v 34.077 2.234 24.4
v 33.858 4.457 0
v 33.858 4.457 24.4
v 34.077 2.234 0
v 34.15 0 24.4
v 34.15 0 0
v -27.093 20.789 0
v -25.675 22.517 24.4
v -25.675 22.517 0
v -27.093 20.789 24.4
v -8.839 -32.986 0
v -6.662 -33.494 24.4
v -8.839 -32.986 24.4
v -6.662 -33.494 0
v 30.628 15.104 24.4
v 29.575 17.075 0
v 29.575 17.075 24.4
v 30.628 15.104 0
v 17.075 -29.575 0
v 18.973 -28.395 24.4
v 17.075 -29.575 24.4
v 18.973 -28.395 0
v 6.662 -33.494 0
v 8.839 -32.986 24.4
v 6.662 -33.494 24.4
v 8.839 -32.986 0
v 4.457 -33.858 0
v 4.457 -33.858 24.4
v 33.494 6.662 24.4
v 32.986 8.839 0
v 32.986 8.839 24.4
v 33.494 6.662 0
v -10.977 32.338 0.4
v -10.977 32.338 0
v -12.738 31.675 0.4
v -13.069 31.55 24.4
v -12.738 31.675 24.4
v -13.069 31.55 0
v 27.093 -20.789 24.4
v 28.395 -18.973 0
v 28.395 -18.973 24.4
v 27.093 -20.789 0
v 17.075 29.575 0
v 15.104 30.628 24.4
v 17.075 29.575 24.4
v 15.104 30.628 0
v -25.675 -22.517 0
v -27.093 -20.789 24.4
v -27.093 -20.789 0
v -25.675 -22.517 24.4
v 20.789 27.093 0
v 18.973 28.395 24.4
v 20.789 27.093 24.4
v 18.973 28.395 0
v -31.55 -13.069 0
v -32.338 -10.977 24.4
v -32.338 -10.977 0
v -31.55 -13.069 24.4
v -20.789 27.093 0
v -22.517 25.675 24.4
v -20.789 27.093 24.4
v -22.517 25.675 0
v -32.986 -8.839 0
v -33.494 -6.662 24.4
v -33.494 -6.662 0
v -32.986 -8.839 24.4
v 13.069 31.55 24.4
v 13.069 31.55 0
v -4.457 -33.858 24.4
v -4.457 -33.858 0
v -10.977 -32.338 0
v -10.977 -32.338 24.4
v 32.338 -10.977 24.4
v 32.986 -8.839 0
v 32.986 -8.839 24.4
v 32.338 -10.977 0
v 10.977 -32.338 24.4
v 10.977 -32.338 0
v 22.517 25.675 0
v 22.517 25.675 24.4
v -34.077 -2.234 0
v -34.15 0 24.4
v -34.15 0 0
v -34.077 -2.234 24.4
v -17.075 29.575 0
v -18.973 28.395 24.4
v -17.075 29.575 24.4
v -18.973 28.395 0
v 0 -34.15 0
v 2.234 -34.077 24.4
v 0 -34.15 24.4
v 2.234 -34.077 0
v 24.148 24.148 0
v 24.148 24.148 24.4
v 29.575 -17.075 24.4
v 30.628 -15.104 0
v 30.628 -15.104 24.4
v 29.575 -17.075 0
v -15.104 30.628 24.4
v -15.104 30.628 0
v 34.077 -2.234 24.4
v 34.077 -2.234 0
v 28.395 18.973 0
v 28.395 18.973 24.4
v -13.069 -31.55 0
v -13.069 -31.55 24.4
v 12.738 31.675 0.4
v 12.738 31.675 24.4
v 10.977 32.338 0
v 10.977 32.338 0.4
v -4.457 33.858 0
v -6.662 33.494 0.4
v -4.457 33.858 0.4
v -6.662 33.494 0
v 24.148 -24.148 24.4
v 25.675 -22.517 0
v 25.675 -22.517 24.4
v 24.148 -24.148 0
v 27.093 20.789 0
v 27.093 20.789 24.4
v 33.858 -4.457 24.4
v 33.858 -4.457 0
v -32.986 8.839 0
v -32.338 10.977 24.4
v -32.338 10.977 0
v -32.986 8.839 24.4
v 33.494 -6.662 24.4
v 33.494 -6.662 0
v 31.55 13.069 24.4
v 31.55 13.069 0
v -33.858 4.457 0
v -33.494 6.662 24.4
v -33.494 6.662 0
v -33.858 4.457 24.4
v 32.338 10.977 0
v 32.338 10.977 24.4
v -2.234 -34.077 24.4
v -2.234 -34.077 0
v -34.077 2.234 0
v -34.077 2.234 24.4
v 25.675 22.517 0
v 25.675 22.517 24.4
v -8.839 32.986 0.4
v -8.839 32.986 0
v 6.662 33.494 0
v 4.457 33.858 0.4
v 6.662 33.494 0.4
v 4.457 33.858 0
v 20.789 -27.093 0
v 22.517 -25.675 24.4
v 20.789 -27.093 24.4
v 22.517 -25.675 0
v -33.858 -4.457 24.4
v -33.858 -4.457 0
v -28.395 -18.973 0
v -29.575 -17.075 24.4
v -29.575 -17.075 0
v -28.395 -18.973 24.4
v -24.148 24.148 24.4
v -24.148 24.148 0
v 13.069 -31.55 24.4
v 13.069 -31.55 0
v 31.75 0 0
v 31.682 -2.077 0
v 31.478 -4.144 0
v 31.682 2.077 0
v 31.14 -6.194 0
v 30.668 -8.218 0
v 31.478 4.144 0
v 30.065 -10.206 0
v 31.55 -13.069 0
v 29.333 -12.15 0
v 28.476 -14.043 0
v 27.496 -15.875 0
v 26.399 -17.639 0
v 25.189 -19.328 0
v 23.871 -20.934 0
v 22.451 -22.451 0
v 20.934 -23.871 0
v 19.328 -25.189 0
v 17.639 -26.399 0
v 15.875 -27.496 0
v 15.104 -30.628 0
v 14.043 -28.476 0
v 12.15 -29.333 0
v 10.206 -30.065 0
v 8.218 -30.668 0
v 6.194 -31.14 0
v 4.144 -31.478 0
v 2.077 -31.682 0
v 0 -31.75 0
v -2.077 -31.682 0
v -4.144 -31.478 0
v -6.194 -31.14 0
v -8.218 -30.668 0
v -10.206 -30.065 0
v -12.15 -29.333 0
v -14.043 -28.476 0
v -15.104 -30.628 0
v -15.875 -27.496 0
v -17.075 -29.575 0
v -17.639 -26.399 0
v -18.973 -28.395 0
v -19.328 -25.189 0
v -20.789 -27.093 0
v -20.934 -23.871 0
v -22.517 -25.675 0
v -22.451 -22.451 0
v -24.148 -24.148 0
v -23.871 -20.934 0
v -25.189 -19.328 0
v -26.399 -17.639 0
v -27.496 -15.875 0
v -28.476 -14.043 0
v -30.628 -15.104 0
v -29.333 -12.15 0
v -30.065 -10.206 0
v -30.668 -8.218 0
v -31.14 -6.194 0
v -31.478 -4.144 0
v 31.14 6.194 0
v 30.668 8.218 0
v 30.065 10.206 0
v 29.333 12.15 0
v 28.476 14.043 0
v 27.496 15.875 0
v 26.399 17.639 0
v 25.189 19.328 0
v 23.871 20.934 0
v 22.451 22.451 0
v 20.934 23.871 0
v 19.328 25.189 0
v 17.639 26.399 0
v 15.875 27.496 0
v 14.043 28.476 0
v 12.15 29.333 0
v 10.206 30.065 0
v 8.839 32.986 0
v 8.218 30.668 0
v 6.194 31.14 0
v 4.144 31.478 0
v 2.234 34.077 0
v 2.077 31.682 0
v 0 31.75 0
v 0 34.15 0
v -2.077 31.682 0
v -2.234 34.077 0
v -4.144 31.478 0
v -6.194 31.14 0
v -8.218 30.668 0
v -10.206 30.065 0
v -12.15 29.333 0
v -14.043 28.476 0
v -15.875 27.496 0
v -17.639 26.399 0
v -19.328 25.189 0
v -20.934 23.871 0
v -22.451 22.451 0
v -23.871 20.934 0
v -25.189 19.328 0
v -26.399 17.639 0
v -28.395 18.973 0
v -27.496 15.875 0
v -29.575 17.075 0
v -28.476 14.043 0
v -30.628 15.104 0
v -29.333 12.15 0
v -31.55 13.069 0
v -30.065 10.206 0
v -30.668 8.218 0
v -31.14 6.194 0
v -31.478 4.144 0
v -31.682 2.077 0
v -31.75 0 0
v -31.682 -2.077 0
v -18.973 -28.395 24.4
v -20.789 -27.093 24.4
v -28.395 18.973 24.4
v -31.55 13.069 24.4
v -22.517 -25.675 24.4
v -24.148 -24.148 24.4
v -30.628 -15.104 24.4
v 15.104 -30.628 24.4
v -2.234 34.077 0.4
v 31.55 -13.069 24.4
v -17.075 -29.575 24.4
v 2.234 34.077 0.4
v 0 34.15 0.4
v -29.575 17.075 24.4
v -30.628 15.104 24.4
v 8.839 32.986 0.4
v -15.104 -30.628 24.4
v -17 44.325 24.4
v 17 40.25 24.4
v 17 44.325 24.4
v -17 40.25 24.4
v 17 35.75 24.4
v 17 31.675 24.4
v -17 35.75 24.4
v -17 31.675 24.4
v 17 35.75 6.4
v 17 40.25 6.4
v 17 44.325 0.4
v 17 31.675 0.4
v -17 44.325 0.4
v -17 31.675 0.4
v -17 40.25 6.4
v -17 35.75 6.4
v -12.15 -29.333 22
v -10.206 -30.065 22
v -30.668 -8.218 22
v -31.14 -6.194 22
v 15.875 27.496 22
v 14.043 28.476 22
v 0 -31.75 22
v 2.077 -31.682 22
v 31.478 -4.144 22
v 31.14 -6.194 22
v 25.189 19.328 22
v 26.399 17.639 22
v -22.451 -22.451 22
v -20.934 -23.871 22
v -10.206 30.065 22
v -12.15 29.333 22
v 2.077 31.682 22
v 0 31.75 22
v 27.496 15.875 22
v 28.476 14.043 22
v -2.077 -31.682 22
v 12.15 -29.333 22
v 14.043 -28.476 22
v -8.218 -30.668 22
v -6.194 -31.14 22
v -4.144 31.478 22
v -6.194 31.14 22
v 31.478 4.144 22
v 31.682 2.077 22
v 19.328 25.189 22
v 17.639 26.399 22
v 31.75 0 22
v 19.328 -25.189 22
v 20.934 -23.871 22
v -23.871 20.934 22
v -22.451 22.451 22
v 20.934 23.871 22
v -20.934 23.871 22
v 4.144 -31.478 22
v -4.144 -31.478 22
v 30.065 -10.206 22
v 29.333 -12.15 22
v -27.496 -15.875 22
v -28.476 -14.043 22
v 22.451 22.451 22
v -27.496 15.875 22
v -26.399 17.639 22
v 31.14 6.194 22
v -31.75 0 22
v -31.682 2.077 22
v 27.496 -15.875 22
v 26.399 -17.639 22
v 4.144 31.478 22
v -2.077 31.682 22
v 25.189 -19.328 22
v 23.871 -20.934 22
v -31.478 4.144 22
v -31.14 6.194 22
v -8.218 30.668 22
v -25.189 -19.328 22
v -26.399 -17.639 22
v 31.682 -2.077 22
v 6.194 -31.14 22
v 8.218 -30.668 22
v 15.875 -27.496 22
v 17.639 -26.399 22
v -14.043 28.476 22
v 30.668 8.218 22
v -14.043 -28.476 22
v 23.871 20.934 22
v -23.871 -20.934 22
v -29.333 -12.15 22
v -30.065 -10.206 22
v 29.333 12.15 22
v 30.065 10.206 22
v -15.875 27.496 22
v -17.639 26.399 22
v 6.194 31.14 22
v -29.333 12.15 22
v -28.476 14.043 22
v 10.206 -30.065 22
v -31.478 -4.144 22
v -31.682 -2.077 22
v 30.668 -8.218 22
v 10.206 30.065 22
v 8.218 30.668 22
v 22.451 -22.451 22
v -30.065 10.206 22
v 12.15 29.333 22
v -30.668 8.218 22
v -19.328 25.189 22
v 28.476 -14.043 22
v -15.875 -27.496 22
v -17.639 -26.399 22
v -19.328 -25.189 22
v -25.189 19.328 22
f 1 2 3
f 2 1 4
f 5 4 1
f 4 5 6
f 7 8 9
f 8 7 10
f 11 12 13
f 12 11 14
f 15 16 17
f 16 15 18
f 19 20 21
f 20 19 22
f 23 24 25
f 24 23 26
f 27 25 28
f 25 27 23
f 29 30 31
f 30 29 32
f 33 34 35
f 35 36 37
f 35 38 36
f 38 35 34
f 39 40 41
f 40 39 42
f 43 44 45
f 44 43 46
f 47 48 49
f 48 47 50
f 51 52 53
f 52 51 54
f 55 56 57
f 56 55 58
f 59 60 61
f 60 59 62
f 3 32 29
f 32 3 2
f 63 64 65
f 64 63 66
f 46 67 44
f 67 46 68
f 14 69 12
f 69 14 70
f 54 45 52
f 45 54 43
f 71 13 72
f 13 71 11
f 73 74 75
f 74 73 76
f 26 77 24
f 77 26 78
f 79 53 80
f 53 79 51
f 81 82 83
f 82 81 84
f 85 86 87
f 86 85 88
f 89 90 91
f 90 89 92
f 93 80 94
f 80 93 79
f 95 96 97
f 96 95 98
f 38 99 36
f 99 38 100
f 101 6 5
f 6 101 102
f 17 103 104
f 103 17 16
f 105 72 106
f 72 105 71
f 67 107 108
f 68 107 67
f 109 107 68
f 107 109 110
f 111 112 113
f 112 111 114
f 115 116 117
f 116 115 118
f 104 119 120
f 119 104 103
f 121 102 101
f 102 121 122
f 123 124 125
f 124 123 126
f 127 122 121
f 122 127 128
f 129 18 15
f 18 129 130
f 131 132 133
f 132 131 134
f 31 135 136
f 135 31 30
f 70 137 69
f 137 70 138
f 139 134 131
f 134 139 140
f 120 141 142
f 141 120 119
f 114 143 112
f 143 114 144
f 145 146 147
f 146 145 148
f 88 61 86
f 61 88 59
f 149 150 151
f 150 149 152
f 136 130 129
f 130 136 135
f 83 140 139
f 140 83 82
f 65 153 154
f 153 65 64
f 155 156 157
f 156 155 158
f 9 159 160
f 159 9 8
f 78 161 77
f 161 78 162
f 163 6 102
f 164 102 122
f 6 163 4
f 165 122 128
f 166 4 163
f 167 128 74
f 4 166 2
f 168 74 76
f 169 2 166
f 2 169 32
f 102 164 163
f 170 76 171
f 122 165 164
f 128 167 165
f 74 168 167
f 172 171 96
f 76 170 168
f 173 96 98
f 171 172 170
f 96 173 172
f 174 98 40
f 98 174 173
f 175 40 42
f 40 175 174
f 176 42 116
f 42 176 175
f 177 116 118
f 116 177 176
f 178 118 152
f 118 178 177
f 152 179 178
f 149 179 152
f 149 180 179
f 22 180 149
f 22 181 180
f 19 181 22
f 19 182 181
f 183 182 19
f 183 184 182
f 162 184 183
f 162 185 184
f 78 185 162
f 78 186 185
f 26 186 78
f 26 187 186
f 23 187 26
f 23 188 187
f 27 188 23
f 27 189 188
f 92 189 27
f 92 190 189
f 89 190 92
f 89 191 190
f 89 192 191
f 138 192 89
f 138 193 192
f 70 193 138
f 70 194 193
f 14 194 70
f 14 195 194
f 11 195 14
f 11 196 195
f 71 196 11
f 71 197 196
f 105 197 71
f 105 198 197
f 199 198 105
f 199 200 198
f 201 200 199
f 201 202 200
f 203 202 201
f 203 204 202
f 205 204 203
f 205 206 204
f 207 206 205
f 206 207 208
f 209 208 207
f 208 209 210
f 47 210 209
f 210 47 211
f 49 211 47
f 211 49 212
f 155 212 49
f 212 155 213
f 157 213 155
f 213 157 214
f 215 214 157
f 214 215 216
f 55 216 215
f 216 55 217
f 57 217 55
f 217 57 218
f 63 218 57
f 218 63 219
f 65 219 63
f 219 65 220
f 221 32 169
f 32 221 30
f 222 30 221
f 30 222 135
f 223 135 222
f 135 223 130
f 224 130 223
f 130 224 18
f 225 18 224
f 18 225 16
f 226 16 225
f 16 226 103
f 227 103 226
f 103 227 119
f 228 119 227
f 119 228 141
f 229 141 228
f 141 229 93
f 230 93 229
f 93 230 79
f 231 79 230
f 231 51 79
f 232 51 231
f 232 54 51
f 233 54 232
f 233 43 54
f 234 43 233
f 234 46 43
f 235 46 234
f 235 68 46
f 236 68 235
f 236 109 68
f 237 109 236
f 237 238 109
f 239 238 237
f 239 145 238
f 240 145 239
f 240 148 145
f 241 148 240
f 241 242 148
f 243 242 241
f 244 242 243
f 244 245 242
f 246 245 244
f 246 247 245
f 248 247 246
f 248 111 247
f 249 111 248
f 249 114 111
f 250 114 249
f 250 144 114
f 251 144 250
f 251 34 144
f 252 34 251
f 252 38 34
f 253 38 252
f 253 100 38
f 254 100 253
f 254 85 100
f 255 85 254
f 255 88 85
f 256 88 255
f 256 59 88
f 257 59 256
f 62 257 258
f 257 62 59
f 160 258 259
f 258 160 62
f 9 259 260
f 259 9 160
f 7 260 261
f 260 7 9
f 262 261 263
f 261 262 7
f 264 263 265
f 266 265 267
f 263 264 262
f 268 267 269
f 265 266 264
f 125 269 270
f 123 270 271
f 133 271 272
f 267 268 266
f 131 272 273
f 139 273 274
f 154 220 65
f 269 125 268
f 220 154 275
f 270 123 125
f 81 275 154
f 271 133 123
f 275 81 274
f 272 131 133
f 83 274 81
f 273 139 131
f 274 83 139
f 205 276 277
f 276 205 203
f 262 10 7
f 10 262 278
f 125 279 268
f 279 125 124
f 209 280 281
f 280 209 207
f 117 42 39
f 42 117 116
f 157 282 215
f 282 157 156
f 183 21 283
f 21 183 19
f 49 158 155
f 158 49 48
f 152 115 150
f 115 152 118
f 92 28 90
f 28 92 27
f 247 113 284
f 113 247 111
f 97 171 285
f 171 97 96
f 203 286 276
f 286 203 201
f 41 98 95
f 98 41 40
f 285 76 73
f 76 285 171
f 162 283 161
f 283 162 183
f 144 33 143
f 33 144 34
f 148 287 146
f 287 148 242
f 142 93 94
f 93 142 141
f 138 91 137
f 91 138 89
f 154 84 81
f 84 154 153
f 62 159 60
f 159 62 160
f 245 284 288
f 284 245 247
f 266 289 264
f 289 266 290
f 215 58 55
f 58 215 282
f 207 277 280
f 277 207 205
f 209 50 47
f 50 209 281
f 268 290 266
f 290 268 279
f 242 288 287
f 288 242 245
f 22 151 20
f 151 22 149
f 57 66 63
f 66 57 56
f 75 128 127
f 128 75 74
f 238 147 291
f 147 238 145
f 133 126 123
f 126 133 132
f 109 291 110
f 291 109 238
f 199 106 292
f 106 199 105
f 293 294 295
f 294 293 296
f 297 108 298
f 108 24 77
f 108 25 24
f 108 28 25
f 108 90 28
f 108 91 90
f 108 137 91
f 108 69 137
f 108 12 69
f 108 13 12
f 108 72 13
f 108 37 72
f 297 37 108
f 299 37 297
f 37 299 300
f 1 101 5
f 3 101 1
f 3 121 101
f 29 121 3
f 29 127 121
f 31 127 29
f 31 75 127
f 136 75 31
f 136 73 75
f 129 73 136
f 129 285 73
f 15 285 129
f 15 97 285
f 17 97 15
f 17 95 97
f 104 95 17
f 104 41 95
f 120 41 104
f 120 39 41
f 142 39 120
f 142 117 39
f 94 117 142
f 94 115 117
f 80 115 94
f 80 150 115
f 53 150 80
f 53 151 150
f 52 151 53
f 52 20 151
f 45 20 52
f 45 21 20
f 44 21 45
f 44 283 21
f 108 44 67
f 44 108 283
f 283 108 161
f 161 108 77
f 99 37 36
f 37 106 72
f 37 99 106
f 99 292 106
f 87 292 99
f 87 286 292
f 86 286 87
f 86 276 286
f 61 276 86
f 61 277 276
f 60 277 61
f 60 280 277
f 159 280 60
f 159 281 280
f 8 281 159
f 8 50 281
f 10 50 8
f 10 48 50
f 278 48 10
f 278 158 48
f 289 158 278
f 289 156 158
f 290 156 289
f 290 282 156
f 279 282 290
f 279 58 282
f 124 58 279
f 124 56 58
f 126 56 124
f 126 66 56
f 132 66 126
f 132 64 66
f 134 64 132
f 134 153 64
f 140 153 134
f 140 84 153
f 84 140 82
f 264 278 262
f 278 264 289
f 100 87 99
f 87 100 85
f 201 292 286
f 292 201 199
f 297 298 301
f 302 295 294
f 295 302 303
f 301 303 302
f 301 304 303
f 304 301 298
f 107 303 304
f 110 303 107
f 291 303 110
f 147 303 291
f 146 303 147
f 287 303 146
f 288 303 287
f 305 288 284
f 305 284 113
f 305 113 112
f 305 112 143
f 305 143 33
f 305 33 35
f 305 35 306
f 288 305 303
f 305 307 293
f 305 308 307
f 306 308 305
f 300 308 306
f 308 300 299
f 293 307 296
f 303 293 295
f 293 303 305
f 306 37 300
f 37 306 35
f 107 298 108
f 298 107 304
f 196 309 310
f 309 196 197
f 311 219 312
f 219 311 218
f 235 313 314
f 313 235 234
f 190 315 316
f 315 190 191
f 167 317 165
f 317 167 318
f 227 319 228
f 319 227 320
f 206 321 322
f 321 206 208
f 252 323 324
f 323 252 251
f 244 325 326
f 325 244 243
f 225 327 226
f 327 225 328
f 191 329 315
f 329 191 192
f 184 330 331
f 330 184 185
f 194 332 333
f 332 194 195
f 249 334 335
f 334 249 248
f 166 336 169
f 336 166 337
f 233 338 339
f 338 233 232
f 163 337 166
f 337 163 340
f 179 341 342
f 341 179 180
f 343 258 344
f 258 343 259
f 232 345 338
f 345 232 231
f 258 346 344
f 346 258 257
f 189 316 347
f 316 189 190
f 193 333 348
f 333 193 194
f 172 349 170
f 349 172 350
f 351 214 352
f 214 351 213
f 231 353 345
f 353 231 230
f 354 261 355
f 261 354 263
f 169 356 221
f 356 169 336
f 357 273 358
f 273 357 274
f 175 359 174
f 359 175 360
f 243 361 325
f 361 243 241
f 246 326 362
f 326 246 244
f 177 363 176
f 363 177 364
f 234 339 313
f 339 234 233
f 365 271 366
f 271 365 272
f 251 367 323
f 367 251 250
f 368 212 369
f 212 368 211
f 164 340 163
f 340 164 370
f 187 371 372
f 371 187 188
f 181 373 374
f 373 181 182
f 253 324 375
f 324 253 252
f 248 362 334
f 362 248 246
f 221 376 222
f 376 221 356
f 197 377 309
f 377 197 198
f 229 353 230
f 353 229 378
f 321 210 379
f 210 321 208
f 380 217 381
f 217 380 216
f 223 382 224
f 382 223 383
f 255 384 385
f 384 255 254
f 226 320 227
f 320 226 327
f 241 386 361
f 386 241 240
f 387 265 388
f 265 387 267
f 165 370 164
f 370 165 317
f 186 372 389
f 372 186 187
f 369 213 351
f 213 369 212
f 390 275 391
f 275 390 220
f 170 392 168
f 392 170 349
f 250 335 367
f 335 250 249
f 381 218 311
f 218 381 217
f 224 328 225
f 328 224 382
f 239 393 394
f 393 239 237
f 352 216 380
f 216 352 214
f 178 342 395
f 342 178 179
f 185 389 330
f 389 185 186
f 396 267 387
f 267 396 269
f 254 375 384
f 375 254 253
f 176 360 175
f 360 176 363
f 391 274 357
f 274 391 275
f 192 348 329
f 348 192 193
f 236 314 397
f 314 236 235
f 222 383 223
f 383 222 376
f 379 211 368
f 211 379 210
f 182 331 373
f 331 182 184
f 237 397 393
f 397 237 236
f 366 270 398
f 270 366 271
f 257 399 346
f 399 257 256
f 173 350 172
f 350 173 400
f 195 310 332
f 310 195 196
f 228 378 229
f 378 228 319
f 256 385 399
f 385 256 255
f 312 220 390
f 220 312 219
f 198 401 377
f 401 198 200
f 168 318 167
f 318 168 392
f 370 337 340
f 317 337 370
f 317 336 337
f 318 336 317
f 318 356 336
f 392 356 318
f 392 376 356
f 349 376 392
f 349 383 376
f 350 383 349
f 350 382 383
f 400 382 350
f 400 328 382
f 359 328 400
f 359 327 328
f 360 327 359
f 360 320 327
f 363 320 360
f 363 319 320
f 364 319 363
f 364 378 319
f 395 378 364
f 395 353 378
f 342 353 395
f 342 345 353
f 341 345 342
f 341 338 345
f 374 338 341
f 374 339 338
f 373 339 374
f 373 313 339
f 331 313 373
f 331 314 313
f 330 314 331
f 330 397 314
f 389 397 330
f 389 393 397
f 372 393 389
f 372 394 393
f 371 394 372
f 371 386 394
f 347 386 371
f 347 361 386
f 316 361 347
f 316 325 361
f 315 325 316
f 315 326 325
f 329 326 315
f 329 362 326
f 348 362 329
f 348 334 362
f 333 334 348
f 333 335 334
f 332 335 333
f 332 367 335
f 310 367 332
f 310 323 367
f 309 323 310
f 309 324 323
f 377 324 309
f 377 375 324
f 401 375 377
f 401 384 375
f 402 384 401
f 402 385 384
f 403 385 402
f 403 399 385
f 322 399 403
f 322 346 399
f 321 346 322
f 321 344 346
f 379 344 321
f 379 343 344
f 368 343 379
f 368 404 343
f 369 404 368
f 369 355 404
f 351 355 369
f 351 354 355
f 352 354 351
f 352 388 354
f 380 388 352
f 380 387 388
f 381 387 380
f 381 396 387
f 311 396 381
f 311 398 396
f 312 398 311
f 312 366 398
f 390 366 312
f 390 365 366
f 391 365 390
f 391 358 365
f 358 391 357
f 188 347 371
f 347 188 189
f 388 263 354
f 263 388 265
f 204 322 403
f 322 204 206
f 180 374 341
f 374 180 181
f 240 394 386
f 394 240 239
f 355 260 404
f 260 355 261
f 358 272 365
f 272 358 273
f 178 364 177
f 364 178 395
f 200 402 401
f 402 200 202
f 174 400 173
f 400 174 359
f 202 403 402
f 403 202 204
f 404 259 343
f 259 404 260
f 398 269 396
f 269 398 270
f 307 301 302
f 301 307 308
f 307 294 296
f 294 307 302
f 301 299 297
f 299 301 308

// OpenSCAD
// Comandante C40 cap + crank hanger (v1)
// One cap, two jobs: it covers the body's top opening against dust
// (same cup as the dust cap v1), and the detached crank HANGS from
// it: an ear on the cap's rim carries a vertical slot, the crank's
// lid disc (58 dia. x ~3 thick) drops edge-on into the slot, and the
// arm + knob hang down alongside the body - the way the JHAT stand
// and the wavexx / Lastaforest top caps park the crank. No stand
// footprint is spent on the crank at all.
// Units: mm. Prints mouth-down, support-free (the ear's slot is open
// at the top and prints as a bridge-free channel in this orientation:
// rotate so the slot faces up if your slicer prefers).
// inner_d is carried over from the dust cap v1 fit test (MEASURE).

part = "cap"; // ["cap", "both"]

/* [Cap] */
inner_d = 63.5;        // inner diameter (body outer + clearance) (MEASURE)
depth = 22;            // inner depth (how far the cap drops over the body)
wall = 2.4;            // side wall and top thickness

/* [Hanger ear - at the back of the cap] */
ear_w = 34;            // ear width (X, tangential)
ear_out = 12;          // ear reach beyond the cap's outer wall (Y)
ear_top = 0;           // ear top relative to the cap top (0 = flush)
slot_w = 4.5;          // slot width (Y): lid disc ~3 + clearance
slot_depth = 18;       // slot depth from the ear top
slot_cy = 38;          // slot centre distance from the axis (Y)

$fn = 96;

outer_d = inner_d + wall * 2;
outer_r = outer_d / 2;
cap_h = depth + wall;

module cap() {
    difference() {
        union() {
            cylinder(h = cap_h, d = outer_d);
            // ear block at the back, embedded into the cap wall
            translate([0, slot_cy, cap_h + ear_top - (slot_depth + 6) / 2])
                cube([ear_w, outer_r + ear_out - slot_cy + slot_w, slot_depth + 6], center = true);
        }
        // body cavity
        translate([0, 0, -1]) cylinder(h = depth + 1, d = inner_d);
        // hanger slot across the ear (open at the top and both ends)
        translate([0, slot_cy, cap_h + ear_top - slot_depth / 2 + 1])
            cube([ear_w + 2, slot_w, slot_depth + 2], center = true);
    }
}

if (part == "cap") cap();
if (part == "both") cap();
